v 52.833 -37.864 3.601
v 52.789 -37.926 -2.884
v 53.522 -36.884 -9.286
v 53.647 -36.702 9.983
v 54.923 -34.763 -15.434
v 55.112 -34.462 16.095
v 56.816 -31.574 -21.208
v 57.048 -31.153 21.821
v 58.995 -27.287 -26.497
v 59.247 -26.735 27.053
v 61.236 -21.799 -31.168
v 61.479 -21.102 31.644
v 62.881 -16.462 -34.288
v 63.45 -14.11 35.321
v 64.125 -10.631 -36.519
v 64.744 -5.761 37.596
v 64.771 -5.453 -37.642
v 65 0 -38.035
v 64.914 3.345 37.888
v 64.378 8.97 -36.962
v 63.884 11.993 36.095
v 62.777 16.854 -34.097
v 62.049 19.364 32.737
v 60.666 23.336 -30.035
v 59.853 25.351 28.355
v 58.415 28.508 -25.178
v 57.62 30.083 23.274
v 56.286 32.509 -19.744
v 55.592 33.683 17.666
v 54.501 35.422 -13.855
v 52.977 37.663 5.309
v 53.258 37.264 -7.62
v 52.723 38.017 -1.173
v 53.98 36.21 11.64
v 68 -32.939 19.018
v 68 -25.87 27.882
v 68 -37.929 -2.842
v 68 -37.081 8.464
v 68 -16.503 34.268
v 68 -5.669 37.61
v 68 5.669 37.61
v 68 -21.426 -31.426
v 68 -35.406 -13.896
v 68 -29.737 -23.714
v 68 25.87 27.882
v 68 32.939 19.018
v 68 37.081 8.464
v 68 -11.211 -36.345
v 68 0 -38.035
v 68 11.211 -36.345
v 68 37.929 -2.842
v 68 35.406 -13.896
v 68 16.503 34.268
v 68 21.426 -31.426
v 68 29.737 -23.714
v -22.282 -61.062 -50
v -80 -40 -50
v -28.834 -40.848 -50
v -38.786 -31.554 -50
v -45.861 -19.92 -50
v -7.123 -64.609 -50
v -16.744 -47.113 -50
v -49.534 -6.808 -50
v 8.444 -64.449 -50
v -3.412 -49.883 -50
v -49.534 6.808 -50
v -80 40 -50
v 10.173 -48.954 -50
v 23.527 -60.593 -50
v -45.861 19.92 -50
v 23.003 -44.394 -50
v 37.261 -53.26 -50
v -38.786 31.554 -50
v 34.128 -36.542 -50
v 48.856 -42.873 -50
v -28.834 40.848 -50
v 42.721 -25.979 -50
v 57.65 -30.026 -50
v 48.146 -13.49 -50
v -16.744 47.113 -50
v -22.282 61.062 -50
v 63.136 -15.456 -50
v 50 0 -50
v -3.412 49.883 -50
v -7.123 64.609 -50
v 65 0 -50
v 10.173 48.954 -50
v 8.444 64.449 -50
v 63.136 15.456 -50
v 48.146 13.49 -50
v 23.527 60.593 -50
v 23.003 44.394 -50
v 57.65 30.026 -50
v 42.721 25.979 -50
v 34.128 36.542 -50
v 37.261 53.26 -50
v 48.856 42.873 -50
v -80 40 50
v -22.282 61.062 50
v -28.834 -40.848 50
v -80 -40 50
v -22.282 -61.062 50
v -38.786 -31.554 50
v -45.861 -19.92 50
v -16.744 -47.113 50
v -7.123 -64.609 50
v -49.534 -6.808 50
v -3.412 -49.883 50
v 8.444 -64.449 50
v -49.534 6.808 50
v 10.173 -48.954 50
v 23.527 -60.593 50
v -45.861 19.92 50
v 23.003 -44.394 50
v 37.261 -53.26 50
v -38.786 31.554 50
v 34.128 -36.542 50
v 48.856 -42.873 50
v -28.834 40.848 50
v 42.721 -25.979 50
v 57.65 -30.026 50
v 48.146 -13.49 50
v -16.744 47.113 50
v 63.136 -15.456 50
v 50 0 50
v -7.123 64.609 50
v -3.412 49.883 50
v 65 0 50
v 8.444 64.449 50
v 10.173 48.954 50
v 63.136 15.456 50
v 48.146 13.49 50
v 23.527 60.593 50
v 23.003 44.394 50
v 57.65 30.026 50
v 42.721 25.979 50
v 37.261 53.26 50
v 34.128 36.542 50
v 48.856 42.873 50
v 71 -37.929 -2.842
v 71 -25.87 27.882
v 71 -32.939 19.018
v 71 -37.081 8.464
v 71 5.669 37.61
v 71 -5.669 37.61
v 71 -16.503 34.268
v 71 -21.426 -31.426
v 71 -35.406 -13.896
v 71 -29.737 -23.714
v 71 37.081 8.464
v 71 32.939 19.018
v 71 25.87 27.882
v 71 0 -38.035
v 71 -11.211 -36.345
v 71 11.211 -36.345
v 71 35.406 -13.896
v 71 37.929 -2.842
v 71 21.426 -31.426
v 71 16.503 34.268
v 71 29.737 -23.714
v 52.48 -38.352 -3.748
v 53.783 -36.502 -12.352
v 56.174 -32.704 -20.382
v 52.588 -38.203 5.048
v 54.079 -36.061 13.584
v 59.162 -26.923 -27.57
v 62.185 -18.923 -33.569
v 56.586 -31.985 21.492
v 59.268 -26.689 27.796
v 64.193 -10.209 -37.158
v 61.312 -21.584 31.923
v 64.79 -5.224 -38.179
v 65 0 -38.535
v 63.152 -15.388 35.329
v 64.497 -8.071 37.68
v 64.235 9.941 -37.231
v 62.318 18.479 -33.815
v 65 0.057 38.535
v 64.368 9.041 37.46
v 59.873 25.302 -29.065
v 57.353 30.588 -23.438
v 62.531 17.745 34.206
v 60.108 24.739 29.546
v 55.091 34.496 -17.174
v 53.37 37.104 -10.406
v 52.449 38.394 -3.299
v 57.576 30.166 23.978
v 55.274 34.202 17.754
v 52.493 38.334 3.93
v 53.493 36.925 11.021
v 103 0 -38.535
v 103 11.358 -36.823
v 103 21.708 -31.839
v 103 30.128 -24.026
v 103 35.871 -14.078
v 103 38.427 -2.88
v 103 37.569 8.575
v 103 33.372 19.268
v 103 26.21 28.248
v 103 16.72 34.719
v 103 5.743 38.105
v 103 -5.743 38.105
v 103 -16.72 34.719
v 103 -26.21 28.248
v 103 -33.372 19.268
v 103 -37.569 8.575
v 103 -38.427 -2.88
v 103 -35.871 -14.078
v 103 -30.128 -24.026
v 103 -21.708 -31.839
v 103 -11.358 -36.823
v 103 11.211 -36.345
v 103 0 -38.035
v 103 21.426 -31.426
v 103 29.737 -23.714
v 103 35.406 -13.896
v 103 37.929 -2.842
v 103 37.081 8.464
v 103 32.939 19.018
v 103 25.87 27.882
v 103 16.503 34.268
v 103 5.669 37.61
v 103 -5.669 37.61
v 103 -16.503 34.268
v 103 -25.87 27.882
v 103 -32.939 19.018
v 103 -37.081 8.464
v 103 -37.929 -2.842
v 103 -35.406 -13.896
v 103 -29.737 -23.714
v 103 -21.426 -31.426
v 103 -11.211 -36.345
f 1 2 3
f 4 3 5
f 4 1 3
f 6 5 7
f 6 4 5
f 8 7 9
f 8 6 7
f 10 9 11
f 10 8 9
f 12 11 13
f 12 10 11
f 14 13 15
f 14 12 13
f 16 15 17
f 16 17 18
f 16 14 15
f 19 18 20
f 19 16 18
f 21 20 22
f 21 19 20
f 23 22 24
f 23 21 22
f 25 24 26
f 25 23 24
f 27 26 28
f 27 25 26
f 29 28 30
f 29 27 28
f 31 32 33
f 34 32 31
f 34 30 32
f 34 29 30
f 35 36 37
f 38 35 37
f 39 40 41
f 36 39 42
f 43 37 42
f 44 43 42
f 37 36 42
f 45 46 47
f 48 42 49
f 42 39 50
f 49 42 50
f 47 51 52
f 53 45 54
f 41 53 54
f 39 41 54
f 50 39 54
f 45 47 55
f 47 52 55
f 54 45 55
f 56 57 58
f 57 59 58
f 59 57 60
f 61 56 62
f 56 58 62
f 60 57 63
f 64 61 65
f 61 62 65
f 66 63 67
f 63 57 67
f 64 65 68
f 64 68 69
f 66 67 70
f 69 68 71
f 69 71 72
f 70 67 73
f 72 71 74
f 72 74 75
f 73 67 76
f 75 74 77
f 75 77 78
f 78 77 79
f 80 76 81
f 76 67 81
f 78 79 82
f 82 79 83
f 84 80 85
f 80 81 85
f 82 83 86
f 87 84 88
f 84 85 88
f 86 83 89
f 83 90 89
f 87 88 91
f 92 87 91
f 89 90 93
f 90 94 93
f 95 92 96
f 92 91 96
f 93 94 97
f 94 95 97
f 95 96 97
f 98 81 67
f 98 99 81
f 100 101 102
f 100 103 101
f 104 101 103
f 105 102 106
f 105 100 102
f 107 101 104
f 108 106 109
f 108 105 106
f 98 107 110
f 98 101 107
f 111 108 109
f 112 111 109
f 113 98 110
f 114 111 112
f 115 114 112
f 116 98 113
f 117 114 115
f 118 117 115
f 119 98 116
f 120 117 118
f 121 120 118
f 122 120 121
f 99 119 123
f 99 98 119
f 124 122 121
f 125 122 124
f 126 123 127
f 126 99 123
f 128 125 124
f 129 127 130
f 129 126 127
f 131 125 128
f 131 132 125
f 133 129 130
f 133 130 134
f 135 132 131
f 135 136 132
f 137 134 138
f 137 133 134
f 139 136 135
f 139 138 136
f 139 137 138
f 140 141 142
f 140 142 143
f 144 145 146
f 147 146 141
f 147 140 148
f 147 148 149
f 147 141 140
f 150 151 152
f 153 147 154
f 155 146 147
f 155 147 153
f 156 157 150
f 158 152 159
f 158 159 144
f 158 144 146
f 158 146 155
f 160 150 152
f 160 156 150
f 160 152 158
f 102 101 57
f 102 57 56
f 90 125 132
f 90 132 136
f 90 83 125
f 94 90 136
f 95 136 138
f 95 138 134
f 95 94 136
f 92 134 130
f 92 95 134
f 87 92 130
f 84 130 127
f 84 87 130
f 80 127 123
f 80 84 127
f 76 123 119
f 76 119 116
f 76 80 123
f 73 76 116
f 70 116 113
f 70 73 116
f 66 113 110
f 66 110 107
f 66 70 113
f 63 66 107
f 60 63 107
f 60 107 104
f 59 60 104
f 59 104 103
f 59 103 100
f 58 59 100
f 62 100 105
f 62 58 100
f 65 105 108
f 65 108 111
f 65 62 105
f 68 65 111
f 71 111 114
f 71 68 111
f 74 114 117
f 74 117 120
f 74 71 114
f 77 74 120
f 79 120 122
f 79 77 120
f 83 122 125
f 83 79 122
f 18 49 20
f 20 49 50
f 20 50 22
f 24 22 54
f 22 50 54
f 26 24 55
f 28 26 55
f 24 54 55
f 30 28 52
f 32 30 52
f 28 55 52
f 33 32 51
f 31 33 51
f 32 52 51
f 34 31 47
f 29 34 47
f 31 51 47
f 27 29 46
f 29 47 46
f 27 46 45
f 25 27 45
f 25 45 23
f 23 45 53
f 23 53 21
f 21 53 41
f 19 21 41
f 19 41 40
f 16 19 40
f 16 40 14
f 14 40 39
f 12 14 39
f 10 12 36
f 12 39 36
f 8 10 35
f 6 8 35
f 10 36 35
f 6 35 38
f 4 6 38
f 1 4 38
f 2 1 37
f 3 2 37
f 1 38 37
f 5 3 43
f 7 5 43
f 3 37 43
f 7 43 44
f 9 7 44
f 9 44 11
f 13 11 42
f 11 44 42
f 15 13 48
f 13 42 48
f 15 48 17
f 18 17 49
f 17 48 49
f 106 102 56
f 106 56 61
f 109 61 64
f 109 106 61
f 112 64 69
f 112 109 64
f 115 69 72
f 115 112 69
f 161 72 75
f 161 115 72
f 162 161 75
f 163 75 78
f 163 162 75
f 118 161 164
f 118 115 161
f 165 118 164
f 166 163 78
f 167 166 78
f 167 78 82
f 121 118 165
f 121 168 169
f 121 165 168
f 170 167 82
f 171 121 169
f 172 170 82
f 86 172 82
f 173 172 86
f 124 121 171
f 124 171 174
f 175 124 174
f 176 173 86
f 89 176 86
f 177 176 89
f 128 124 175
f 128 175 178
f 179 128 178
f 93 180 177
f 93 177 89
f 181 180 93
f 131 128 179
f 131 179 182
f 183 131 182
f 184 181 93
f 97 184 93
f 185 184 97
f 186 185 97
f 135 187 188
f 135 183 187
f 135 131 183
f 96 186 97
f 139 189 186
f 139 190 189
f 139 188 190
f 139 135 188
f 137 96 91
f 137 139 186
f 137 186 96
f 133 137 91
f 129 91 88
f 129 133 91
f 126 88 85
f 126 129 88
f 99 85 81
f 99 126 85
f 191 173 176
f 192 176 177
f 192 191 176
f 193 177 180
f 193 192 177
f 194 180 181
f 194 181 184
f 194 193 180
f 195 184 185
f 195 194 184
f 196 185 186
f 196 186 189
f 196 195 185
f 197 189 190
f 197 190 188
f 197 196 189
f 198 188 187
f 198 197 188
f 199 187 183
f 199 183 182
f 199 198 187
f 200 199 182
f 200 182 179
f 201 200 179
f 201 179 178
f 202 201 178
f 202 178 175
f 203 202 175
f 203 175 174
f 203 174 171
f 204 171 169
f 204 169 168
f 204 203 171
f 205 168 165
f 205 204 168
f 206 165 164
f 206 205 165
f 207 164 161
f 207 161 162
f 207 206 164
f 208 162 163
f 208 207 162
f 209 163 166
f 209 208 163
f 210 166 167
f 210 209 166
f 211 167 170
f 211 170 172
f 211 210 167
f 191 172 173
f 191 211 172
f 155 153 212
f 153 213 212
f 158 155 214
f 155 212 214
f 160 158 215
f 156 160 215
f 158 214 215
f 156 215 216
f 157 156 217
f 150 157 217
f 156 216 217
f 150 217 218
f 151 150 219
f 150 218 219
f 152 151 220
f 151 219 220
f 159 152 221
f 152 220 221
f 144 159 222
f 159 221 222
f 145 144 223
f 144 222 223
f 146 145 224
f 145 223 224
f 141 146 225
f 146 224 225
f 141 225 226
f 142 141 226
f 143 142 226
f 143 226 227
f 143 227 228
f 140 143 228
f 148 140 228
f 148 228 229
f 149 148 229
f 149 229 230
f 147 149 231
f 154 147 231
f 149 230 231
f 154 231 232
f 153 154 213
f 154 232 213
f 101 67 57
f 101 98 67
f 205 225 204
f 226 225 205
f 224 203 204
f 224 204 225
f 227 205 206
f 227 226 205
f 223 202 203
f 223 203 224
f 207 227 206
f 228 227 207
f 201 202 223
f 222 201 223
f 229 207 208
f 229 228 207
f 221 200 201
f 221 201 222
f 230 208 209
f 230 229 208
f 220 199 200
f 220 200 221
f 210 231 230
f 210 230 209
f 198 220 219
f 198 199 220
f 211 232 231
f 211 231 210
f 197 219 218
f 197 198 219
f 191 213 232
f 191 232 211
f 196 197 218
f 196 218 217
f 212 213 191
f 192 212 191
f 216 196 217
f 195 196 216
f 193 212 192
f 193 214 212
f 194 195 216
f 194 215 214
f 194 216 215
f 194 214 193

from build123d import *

# Parameters (mm, degrees)
SKETCH1_R                = 50
BOSS_EXTRUDE1_DEPTH      = 50
BOSS_EXTRUDE2_REACH      = 202.534
BOSS_EXTRUDE2_END_RADIUS = 65
SKETCH2_R                = 38.535
SKETCH2_R_2              = 38.035
BOSS_EXTRUDE3_START      = 3
SKETCH4_R                = 38.035
BOSS_EXTRUDE3_DEPTH      = 3


with BuildPart() as part:
    # Sketch1 → Boss-Extrude1 (new, symmetric)
    with BuildSketch(Plane.XY):
        with BuildLine():
            Line((-80, 40), (-80, -40))
            Line((-80, -40), (-22.281665693, -61.061668614))
            ThreePointArc((-22.281665693, -61.061668614), (65, 0), (-22.281665693, 61.061668614))
            Line((-22.281665693, 61.061668614), (-80, 40))
        make_face()
        Circle(SKETCH1_R, mode=Mode.SUBTRACT)
    extrude(amount=BOSS_EXTRUDE1_DEPTH, both=True)

    # Boss-Extrude2: up to this cylinder (the profile starts outside it)
    boss_extrude2_end = Plane(origin=(0, 0, 38.426007), z_dir=(0, 0, -1)) * Cylinder(BOSS_EXTRUDE2_END_RADIUS, 536.068, mode=Mode.PRIVATE)
    # Sketch2 → Boss-Extrude2 (add, up to the surface)
    with BuildSketch(Plane(origin=(103, 0, 0), x_dir=(0, 0, -1), z_dir=(1, 0, 0)), mode=Mode.PRIVATE) as boss_extrude2_sk1:
        Circle(SKETCH2_R)
        Circle(SKETCH2_R_2, mode=Mode.SUBTRACT)
    boss_extrude2_tool1 = extrude(boss_extrude2_sk1.sketch, amount=-BOSS_EXTRUDE2_REACH, mode=Mode.PRIVATE) - boss_extrude2_end
    add(boss_extrude2_tool1.solids().sort_by_distance((103, 0, 38.426007))[0])

    # Sketch4 → Boss-Extrude3 (add)
    with BuildSketch(Plane(origin=(68, 0, 0), x_dir=(0, 0, -1), z_dir=(1, 0, 0)).offset(BOSS_EXTRUDE3_START)):
        Circle(SKETCH4_R)
    extrude(amount=-BOSS_EXTRUDE3_DEPTH)


solid = part.part
